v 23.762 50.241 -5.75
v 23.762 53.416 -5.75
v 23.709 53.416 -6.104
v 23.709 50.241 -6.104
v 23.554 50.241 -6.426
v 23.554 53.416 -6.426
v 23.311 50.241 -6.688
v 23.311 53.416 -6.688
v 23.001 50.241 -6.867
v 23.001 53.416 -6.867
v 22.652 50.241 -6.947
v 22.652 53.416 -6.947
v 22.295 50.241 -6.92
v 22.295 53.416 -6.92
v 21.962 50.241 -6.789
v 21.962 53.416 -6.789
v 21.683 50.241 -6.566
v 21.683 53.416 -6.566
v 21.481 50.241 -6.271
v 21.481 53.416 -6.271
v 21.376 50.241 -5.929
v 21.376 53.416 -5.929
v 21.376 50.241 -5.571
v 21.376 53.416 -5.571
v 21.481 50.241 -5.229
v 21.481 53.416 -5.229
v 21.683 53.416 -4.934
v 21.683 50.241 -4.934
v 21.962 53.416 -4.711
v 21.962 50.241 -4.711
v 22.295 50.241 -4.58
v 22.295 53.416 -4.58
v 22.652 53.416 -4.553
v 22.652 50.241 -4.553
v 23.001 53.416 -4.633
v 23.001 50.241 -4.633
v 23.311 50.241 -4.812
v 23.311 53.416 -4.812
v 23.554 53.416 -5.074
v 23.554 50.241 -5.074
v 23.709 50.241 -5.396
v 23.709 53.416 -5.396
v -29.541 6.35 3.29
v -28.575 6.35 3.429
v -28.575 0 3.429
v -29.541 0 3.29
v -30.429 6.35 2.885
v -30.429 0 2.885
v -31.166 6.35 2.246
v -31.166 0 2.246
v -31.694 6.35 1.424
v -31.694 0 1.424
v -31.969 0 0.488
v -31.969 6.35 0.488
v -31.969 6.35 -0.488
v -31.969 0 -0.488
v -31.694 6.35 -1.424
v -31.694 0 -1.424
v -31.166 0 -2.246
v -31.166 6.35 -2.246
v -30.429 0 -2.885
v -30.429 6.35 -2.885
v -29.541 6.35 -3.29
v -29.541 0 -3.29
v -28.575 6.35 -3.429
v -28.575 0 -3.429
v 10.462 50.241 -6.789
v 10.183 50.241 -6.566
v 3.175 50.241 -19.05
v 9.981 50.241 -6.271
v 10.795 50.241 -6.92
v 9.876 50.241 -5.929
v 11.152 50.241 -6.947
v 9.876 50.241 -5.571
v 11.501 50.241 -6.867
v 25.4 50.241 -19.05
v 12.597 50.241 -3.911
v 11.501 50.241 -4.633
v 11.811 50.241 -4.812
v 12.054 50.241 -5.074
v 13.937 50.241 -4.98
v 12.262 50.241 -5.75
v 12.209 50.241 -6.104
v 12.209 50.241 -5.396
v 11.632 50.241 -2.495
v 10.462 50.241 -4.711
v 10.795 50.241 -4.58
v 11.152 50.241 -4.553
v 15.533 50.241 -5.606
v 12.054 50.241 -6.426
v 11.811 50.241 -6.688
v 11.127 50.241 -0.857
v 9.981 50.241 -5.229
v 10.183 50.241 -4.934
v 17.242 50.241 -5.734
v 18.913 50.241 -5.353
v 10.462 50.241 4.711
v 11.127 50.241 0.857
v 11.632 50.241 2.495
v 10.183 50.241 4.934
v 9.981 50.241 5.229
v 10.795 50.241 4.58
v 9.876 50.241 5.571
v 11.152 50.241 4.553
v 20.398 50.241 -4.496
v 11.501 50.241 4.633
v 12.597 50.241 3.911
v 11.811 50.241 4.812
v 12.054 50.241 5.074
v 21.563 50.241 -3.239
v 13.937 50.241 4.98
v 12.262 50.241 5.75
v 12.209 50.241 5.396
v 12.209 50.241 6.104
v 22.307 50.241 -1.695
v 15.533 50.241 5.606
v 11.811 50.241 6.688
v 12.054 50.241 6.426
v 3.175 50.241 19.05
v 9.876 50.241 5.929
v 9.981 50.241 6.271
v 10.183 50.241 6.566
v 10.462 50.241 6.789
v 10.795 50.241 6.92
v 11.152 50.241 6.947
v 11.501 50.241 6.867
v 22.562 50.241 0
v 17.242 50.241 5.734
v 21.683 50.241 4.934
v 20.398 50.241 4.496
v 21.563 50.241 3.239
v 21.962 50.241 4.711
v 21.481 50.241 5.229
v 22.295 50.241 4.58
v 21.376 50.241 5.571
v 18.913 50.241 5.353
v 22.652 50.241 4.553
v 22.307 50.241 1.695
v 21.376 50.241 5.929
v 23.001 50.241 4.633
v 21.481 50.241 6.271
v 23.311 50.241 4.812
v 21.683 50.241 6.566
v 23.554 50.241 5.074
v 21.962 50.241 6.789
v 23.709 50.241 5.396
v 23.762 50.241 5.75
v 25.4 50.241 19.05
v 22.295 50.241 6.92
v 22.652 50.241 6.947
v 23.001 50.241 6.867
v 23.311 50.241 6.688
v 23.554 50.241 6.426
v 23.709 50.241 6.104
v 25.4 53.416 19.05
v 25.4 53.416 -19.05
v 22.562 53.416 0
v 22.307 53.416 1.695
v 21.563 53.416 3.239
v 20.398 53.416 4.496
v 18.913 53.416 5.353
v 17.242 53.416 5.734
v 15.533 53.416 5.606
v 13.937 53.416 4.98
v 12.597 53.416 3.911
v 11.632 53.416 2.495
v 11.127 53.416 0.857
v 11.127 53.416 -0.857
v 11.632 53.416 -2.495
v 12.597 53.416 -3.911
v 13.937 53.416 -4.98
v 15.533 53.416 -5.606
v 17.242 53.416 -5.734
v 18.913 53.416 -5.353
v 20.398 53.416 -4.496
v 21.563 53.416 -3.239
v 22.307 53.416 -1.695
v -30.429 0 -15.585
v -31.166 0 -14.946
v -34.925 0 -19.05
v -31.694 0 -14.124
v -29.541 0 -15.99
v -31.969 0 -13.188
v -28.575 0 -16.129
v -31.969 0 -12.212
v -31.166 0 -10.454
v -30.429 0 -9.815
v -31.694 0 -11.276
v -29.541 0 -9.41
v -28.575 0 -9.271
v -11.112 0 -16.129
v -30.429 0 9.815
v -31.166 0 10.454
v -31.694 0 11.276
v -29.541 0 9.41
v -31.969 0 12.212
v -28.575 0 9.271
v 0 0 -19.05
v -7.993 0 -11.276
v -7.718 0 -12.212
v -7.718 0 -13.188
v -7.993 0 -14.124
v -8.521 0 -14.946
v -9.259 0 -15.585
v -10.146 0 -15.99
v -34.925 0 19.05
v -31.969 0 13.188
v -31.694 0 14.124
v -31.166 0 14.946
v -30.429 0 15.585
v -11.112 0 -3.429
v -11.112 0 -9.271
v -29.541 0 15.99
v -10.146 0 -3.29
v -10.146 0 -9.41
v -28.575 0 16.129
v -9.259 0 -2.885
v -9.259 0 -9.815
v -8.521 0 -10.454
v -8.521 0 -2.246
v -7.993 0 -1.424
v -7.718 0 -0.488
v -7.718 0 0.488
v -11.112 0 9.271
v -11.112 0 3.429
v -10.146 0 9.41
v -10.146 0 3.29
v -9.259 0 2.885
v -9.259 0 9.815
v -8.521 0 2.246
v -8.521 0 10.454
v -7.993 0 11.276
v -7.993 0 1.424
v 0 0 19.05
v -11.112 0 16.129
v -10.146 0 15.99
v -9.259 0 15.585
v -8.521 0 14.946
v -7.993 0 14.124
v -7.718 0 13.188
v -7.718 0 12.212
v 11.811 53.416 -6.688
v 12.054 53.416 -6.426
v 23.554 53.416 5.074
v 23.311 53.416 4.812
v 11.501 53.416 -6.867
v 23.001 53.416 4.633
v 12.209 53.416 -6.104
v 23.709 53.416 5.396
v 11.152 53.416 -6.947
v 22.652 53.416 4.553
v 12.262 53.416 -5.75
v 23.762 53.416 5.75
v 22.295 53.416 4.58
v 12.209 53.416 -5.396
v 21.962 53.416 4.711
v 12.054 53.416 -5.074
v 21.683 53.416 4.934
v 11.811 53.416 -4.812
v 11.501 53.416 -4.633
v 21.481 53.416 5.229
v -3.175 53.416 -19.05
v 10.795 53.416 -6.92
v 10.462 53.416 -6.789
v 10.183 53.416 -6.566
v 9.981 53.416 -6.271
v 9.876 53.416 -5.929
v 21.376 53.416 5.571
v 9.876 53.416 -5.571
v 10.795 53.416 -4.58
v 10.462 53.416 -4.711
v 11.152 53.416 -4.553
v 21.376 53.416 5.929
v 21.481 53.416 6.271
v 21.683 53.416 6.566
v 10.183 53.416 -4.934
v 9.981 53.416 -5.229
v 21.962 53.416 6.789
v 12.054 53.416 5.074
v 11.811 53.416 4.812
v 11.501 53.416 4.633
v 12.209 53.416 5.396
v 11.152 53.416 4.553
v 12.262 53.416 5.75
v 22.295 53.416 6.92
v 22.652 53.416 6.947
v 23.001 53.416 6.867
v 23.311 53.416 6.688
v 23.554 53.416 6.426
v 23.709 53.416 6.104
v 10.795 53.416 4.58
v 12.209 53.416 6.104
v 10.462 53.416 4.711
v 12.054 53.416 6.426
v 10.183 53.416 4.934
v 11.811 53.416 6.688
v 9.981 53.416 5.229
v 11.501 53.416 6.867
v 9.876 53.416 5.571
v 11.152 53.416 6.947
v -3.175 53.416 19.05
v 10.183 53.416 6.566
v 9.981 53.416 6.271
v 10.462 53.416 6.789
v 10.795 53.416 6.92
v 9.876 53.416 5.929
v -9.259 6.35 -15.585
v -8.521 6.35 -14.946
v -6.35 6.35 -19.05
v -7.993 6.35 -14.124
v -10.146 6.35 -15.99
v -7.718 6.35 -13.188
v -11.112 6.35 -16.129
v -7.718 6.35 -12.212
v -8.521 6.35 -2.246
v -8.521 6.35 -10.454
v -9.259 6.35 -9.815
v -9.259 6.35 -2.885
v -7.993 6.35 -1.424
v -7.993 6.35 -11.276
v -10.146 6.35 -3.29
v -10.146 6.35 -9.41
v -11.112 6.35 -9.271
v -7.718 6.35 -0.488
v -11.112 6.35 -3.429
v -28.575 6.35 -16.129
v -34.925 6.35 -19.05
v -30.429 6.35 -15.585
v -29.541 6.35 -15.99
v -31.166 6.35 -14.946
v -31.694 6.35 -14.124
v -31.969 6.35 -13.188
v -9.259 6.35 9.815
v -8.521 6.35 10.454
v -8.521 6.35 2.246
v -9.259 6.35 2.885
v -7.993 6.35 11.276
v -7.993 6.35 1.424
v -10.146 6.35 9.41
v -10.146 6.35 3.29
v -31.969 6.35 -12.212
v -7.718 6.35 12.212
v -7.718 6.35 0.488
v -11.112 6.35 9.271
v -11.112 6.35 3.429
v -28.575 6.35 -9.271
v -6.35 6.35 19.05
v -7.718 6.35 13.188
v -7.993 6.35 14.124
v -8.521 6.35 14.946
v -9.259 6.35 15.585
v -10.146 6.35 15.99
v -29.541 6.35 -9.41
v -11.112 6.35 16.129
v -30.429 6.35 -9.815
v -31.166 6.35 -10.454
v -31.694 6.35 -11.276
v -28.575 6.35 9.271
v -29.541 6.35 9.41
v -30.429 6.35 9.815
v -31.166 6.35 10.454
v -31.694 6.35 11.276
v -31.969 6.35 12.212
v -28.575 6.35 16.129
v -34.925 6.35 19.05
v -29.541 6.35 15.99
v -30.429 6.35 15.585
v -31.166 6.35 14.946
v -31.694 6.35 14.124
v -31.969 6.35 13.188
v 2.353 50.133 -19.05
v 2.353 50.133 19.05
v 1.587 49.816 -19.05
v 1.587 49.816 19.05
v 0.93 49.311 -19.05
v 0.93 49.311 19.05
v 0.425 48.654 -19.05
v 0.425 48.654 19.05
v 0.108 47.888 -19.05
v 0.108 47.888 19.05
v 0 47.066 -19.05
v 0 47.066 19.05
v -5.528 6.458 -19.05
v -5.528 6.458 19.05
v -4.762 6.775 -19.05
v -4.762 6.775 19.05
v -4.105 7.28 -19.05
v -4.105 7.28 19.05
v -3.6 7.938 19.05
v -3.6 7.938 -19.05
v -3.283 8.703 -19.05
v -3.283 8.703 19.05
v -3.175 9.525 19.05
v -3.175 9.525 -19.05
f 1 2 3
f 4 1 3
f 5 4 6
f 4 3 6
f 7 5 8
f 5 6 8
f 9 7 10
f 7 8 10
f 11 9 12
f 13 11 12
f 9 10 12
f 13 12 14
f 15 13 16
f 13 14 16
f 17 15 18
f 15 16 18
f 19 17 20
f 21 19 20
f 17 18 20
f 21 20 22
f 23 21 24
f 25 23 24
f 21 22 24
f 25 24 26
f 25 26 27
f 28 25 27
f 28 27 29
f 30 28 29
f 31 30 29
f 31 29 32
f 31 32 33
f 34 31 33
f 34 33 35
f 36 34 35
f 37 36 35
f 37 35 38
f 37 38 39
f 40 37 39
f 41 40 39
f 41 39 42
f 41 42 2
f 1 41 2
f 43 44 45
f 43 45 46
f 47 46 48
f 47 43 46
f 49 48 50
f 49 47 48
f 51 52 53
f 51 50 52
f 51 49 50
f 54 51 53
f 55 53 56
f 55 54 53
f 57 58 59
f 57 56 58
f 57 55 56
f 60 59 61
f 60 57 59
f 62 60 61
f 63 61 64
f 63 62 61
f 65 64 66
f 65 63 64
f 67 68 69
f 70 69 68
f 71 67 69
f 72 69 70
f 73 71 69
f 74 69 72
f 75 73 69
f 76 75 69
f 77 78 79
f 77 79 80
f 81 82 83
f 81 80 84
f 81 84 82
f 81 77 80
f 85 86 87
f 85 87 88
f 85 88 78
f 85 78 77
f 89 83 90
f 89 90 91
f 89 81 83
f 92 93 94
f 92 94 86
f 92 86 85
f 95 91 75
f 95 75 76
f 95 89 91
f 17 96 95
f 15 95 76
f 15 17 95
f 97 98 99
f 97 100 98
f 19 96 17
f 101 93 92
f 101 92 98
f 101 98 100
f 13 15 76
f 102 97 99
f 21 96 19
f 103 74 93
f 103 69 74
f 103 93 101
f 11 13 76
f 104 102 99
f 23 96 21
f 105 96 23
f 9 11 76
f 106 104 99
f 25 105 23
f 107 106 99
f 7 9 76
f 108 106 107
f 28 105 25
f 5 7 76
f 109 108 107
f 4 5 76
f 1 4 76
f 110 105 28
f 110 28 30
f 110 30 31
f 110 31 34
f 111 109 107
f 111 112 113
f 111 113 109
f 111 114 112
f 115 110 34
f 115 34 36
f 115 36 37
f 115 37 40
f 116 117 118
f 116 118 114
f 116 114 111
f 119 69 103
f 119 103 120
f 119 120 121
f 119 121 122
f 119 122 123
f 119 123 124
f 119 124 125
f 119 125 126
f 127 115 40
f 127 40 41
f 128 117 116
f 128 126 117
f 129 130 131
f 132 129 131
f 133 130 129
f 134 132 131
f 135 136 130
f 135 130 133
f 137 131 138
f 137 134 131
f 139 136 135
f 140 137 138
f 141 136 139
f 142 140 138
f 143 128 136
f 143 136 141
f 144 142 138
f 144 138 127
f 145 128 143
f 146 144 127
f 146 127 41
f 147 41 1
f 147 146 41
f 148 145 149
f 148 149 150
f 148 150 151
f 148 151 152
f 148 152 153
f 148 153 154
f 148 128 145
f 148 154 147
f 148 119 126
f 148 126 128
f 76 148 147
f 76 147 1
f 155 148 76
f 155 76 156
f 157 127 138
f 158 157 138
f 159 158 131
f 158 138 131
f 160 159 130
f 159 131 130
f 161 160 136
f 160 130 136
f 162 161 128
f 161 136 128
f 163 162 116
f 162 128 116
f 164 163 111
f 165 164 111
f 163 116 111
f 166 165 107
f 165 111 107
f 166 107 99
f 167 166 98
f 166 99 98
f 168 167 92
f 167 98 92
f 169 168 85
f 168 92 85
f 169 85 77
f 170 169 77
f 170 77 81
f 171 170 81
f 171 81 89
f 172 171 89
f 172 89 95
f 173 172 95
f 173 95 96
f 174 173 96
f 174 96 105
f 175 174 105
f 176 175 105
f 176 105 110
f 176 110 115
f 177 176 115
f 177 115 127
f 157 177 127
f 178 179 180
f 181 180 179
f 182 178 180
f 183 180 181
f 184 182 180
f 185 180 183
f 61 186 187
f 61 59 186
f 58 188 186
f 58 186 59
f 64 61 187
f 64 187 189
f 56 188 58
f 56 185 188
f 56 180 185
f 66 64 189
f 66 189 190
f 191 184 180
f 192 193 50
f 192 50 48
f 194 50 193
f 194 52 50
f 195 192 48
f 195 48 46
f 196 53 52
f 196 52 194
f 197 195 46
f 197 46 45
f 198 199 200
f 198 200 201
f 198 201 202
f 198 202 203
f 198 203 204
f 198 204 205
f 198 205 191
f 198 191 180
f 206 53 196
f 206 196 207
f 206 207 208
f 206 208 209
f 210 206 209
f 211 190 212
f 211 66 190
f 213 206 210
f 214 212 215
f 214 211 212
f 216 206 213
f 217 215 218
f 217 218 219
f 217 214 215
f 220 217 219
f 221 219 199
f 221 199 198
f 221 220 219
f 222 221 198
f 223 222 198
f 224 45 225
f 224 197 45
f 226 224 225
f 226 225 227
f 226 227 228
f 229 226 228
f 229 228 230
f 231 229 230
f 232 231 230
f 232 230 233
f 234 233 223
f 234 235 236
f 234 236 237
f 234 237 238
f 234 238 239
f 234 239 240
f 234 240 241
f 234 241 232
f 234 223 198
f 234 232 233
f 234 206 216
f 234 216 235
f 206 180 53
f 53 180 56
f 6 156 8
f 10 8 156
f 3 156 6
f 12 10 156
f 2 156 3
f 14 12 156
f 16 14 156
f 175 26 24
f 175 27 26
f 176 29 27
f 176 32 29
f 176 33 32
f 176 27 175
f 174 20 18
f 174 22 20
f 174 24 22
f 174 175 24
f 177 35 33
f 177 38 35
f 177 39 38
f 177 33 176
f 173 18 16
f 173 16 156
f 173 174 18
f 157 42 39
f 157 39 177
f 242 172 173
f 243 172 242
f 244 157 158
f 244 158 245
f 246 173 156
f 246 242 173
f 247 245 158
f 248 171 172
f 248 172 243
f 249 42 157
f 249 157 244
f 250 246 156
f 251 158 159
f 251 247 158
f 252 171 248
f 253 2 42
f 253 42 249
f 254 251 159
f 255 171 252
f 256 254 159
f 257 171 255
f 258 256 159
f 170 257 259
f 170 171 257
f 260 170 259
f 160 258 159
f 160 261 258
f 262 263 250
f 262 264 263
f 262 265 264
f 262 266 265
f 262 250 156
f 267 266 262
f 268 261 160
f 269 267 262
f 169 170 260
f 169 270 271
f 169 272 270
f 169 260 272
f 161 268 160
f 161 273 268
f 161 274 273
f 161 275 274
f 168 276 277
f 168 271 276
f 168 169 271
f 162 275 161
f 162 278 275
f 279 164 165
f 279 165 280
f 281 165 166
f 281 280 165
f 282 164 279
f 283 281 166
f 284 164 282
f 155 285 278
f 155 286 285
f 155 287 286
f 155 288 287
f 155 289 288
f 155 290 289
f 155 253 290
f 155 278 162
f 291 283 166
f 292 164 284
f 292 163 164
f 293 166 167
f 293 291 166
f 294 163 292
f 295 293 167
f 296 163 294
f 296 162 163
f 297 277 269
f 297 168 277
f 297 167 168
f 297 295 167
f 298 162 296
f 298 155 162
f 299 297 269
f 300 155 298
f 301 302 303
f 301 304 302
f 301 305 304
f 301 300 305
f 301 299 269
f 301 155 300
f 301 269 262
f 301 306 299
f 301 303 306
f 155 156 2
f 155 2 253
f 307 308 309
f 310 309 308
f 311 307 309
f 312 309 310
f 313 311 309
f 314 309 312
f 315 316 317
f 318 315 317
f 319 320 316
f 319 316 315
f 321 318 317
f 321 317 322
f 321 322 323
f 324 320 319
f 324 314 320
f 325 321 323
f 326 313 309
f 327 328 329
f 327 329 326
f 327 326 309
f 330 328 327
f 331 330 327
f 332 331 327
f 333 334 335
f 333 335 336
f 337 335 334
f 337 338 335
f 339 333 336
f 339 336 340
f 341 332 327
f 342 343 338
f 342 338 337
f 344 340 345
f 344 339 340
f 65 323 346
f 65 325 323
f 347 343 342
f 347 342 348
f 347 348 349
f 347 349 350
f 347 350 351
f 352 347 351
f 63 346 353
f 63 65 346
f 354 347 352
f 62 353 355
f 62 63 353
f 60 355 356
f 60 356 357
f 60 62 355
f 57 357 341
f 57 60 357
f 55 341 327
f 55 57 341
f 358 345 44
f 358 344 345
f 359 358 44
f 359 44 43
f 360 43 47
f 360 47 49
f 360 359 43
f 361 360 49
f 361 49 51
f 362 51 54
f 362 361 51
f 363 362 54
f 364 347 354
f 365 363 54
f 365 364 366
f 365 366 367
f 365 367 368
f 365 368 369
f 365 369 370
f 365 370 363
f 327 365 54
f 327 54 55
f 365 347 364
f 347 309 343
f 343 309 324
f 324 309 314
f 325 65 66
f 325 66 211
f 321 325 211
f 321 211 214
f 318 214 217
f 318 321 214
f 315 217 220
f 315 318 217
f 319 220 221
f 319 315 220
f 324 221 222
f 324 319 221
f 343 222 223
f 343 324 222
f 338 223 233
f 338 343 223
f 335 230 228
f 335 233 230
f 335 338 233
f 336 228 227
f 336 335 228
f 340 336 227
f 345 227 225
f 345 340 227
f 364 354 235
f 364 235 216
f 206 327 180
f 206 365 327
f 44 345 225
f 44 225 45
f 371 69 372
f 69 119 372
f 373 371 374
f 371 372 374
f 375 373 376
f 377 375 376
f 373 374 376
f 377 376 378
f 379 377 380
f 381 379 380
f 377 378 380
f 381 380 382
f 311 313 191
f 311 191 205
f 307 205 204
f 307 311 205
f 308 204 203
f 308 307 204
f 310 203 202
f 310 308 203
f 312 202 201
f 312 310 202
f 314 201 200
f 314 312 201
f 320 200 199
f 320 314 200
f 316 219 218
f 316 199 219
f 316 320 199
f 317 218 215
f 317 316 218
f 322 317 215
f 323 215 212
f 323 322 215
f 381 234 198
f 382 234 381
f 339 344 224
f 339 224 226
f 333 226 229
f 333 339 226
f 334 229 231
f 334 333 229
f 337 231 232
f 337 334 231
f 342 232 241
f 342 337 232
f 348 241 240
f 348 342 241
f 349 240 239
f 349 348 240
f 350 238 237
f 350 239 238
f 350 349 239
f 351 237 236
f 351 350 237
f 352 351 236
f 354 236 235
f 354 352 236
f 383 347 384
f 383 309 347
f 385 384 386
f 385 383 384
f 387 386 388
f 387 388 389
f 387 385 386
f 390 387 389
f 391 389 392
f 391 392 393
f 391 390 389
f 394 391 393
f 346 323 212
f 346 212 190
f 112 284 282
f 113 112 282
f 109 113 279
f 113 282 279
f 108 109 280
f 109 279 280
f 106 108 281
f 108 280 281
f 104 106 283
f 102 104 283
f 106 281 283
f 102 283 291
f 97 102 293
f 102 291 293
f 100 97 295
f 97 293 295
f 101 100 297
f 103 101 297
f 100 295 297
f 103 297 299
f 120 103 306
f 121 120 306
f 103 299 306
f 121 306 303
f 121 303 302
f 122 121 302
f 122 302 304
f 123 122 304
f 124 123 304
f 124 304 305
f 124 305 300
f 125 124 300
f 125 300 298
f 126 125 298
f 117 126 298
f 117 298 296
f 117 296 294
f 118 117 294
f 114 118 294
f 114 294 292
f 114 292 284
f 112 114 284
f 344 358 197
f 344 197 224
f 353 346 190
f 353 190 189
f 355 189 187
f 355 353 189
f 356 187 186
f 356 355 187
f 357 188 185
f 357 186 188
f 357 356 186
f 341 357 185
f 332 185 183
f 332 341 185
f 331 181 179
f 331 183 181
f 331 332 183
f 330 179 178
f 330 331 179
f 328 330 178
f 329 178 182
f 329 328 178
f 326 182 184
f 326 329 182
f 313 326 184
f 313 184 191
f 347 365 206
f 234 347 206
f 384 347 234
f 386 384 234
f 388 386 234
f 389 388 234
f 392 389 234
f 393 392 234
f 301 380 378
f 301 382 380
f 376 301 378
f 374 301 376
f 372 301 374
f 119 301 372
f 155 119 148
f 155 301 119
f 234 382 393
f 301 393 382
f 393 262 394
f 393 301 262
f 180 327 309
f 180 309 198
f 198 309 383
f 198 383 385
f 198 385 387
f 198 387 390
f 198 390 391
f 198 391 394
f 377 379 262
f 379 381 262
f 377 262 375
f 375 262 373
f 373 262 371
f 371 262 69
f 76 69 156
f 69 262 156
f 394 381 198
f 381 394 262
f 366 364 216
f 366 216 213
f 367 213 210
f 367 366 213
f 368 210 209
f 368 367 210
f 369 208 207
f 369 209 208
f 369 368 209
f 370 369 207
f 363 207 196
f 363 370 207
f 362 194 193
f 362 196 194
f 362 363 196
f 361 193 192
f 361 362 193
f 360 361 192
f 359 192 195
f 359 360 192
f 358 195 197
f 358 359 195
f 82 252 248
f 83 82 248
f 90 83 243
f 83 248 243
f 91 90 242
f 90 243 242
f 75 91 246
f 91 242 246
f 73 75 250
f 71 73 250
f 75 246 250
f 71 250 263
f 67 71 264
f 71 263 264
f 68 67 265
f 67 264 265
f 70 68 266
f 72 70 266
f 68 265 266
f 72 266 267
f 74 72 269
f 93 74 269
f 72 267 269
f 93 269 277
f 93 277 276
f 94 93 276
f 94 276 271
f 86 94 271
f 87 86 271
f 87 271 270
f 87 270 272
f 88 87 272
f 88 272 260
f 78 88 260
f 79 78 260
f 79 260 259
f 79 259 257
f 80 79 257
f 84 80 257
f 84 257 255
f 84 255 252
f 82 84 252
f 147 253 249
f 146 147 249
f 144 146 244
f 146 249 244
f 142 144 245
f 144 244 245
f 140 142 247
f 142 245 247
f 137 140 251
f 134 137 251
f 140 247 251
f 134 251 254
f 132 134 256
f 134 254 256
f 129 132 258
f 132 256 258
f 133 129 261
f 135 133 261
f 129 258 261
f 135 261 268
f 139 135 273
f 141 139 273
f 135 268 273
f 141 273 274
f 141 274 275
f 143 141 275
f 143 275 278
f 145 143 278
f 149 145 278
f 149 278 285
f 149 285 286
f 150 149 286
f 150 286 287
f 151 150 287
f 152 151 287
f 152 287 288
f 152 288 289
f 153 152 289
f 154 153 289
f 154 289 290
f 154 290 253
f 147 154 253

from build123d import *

# Parameters (mm, degrees)
BOSS_EXTRUDE1_DEPTH  = 19.05
FILLET1_R            = 3.175
SKETCH2_R            = 5.75
CUT_EXTRUDE1_DEPTH   = 4.175
M2_CLEARANCE_HOLE1_D = 2.4
CUT_EXTRUDE2_DEPTH   = 7.35
LPATTERN1_COUNT      = 2
LPATTERN1_PITCH      = 12.7
LPATTERN1_COL_COUNT  = 2
LPATTERN1_COL_PITCH  = 12.7


with BuildPart() as part:
    # Sketch1 → Boss-Extrude1 (new body, symmetric)
    with BuildSketch(Plane.XY):
        Polygon((-34.925, 0), (0, 0), (0, 50.2412), (25.4, 50.2412), (25.4, 53.4162), (-3.175, 53.4162), (-3.175, 6.35), (-34.925, 6.35), align=None)
    extrude(amount=BOSS_EXTRUDE1_DEPTH, both=True)

    # Fillet1
    fillet1_edges = [part.edges().sort_by_distance(p)[0] for p in [
        (-3.175, 6.35, 0),
        (0, 50.2412, 0),
    ]]
    fillet(fillet1_edges, radius=FILLET1_R)

    # Sketch2 → Cut-Extrude1 (cut, through all)
    with BuildSketch(Plane(origin=(16.8125, 50.2412, 0), x_dir=(1, 0, 0), z_dir=(0, -1, 0))):
        Circle(SKETCH2_R)
    extrude(amount=-CUT_EXTRUDE1_DEPTH, mode=Mode.SUBTRACT)

    # M2 Clearance Hole1 (through all)
    with Locations(Plane(origin=(16.8125, 50.2412, 0), x_dir=(-1, 0, 0), z_dir=(0, -1, 0))):
        with Locations((-5.75, -5.75), (-5.75, 5.75), (5.75, 5.75), (5.75, -5.75)):
            Hole(M2_CLEARANCE_HOLE1_D / 2)

    # Sketch5 → Cut-Extrude2 (cut, through all)
    with BuildSketch(Plane(origin=(0, 6.35, 0), x_dir=(1, 0, 0), z_dir=(0, 1, 0))):
        with BuildLine():
            Line((-28.575, 3.429), (-11.1125, 3.429))
            ThreePointArc((-11.1125, 3.429), (-7.6835, 0), (-11.1125, -3.429))
            Line((-11.1125, -3.429), (-28.575, -3.429))
            ThreePointArc((-28.575, -3.429), (-32.004, 0), (-28.575, 3.429))
        make_face()
    cut_extrude2 = extrude(amount=-CUT_EXTRUDE2_DEPTH, mode=Mode.SUBTRACT)

    # LPattern1: Cut-Extrude2 ×2
    with Locations(*[(0, 0, i * LPATTERN1_PITCH) for i in range(1, LPATTERN1_COUNT)]):
        add(cut_extrude2, mode=Mode.SUBTRACT)

    # LPattern1 col: Cut-Extrude2 ×2
    with Locations(*[(0, 0, -i * LPATTERN1_COL_PITCH) for i in range(1, LPATTERN1_COL_COUNT)]):
        add(cut_extrude2, mode=Mode.SUBTRACT)


solid = part.part
